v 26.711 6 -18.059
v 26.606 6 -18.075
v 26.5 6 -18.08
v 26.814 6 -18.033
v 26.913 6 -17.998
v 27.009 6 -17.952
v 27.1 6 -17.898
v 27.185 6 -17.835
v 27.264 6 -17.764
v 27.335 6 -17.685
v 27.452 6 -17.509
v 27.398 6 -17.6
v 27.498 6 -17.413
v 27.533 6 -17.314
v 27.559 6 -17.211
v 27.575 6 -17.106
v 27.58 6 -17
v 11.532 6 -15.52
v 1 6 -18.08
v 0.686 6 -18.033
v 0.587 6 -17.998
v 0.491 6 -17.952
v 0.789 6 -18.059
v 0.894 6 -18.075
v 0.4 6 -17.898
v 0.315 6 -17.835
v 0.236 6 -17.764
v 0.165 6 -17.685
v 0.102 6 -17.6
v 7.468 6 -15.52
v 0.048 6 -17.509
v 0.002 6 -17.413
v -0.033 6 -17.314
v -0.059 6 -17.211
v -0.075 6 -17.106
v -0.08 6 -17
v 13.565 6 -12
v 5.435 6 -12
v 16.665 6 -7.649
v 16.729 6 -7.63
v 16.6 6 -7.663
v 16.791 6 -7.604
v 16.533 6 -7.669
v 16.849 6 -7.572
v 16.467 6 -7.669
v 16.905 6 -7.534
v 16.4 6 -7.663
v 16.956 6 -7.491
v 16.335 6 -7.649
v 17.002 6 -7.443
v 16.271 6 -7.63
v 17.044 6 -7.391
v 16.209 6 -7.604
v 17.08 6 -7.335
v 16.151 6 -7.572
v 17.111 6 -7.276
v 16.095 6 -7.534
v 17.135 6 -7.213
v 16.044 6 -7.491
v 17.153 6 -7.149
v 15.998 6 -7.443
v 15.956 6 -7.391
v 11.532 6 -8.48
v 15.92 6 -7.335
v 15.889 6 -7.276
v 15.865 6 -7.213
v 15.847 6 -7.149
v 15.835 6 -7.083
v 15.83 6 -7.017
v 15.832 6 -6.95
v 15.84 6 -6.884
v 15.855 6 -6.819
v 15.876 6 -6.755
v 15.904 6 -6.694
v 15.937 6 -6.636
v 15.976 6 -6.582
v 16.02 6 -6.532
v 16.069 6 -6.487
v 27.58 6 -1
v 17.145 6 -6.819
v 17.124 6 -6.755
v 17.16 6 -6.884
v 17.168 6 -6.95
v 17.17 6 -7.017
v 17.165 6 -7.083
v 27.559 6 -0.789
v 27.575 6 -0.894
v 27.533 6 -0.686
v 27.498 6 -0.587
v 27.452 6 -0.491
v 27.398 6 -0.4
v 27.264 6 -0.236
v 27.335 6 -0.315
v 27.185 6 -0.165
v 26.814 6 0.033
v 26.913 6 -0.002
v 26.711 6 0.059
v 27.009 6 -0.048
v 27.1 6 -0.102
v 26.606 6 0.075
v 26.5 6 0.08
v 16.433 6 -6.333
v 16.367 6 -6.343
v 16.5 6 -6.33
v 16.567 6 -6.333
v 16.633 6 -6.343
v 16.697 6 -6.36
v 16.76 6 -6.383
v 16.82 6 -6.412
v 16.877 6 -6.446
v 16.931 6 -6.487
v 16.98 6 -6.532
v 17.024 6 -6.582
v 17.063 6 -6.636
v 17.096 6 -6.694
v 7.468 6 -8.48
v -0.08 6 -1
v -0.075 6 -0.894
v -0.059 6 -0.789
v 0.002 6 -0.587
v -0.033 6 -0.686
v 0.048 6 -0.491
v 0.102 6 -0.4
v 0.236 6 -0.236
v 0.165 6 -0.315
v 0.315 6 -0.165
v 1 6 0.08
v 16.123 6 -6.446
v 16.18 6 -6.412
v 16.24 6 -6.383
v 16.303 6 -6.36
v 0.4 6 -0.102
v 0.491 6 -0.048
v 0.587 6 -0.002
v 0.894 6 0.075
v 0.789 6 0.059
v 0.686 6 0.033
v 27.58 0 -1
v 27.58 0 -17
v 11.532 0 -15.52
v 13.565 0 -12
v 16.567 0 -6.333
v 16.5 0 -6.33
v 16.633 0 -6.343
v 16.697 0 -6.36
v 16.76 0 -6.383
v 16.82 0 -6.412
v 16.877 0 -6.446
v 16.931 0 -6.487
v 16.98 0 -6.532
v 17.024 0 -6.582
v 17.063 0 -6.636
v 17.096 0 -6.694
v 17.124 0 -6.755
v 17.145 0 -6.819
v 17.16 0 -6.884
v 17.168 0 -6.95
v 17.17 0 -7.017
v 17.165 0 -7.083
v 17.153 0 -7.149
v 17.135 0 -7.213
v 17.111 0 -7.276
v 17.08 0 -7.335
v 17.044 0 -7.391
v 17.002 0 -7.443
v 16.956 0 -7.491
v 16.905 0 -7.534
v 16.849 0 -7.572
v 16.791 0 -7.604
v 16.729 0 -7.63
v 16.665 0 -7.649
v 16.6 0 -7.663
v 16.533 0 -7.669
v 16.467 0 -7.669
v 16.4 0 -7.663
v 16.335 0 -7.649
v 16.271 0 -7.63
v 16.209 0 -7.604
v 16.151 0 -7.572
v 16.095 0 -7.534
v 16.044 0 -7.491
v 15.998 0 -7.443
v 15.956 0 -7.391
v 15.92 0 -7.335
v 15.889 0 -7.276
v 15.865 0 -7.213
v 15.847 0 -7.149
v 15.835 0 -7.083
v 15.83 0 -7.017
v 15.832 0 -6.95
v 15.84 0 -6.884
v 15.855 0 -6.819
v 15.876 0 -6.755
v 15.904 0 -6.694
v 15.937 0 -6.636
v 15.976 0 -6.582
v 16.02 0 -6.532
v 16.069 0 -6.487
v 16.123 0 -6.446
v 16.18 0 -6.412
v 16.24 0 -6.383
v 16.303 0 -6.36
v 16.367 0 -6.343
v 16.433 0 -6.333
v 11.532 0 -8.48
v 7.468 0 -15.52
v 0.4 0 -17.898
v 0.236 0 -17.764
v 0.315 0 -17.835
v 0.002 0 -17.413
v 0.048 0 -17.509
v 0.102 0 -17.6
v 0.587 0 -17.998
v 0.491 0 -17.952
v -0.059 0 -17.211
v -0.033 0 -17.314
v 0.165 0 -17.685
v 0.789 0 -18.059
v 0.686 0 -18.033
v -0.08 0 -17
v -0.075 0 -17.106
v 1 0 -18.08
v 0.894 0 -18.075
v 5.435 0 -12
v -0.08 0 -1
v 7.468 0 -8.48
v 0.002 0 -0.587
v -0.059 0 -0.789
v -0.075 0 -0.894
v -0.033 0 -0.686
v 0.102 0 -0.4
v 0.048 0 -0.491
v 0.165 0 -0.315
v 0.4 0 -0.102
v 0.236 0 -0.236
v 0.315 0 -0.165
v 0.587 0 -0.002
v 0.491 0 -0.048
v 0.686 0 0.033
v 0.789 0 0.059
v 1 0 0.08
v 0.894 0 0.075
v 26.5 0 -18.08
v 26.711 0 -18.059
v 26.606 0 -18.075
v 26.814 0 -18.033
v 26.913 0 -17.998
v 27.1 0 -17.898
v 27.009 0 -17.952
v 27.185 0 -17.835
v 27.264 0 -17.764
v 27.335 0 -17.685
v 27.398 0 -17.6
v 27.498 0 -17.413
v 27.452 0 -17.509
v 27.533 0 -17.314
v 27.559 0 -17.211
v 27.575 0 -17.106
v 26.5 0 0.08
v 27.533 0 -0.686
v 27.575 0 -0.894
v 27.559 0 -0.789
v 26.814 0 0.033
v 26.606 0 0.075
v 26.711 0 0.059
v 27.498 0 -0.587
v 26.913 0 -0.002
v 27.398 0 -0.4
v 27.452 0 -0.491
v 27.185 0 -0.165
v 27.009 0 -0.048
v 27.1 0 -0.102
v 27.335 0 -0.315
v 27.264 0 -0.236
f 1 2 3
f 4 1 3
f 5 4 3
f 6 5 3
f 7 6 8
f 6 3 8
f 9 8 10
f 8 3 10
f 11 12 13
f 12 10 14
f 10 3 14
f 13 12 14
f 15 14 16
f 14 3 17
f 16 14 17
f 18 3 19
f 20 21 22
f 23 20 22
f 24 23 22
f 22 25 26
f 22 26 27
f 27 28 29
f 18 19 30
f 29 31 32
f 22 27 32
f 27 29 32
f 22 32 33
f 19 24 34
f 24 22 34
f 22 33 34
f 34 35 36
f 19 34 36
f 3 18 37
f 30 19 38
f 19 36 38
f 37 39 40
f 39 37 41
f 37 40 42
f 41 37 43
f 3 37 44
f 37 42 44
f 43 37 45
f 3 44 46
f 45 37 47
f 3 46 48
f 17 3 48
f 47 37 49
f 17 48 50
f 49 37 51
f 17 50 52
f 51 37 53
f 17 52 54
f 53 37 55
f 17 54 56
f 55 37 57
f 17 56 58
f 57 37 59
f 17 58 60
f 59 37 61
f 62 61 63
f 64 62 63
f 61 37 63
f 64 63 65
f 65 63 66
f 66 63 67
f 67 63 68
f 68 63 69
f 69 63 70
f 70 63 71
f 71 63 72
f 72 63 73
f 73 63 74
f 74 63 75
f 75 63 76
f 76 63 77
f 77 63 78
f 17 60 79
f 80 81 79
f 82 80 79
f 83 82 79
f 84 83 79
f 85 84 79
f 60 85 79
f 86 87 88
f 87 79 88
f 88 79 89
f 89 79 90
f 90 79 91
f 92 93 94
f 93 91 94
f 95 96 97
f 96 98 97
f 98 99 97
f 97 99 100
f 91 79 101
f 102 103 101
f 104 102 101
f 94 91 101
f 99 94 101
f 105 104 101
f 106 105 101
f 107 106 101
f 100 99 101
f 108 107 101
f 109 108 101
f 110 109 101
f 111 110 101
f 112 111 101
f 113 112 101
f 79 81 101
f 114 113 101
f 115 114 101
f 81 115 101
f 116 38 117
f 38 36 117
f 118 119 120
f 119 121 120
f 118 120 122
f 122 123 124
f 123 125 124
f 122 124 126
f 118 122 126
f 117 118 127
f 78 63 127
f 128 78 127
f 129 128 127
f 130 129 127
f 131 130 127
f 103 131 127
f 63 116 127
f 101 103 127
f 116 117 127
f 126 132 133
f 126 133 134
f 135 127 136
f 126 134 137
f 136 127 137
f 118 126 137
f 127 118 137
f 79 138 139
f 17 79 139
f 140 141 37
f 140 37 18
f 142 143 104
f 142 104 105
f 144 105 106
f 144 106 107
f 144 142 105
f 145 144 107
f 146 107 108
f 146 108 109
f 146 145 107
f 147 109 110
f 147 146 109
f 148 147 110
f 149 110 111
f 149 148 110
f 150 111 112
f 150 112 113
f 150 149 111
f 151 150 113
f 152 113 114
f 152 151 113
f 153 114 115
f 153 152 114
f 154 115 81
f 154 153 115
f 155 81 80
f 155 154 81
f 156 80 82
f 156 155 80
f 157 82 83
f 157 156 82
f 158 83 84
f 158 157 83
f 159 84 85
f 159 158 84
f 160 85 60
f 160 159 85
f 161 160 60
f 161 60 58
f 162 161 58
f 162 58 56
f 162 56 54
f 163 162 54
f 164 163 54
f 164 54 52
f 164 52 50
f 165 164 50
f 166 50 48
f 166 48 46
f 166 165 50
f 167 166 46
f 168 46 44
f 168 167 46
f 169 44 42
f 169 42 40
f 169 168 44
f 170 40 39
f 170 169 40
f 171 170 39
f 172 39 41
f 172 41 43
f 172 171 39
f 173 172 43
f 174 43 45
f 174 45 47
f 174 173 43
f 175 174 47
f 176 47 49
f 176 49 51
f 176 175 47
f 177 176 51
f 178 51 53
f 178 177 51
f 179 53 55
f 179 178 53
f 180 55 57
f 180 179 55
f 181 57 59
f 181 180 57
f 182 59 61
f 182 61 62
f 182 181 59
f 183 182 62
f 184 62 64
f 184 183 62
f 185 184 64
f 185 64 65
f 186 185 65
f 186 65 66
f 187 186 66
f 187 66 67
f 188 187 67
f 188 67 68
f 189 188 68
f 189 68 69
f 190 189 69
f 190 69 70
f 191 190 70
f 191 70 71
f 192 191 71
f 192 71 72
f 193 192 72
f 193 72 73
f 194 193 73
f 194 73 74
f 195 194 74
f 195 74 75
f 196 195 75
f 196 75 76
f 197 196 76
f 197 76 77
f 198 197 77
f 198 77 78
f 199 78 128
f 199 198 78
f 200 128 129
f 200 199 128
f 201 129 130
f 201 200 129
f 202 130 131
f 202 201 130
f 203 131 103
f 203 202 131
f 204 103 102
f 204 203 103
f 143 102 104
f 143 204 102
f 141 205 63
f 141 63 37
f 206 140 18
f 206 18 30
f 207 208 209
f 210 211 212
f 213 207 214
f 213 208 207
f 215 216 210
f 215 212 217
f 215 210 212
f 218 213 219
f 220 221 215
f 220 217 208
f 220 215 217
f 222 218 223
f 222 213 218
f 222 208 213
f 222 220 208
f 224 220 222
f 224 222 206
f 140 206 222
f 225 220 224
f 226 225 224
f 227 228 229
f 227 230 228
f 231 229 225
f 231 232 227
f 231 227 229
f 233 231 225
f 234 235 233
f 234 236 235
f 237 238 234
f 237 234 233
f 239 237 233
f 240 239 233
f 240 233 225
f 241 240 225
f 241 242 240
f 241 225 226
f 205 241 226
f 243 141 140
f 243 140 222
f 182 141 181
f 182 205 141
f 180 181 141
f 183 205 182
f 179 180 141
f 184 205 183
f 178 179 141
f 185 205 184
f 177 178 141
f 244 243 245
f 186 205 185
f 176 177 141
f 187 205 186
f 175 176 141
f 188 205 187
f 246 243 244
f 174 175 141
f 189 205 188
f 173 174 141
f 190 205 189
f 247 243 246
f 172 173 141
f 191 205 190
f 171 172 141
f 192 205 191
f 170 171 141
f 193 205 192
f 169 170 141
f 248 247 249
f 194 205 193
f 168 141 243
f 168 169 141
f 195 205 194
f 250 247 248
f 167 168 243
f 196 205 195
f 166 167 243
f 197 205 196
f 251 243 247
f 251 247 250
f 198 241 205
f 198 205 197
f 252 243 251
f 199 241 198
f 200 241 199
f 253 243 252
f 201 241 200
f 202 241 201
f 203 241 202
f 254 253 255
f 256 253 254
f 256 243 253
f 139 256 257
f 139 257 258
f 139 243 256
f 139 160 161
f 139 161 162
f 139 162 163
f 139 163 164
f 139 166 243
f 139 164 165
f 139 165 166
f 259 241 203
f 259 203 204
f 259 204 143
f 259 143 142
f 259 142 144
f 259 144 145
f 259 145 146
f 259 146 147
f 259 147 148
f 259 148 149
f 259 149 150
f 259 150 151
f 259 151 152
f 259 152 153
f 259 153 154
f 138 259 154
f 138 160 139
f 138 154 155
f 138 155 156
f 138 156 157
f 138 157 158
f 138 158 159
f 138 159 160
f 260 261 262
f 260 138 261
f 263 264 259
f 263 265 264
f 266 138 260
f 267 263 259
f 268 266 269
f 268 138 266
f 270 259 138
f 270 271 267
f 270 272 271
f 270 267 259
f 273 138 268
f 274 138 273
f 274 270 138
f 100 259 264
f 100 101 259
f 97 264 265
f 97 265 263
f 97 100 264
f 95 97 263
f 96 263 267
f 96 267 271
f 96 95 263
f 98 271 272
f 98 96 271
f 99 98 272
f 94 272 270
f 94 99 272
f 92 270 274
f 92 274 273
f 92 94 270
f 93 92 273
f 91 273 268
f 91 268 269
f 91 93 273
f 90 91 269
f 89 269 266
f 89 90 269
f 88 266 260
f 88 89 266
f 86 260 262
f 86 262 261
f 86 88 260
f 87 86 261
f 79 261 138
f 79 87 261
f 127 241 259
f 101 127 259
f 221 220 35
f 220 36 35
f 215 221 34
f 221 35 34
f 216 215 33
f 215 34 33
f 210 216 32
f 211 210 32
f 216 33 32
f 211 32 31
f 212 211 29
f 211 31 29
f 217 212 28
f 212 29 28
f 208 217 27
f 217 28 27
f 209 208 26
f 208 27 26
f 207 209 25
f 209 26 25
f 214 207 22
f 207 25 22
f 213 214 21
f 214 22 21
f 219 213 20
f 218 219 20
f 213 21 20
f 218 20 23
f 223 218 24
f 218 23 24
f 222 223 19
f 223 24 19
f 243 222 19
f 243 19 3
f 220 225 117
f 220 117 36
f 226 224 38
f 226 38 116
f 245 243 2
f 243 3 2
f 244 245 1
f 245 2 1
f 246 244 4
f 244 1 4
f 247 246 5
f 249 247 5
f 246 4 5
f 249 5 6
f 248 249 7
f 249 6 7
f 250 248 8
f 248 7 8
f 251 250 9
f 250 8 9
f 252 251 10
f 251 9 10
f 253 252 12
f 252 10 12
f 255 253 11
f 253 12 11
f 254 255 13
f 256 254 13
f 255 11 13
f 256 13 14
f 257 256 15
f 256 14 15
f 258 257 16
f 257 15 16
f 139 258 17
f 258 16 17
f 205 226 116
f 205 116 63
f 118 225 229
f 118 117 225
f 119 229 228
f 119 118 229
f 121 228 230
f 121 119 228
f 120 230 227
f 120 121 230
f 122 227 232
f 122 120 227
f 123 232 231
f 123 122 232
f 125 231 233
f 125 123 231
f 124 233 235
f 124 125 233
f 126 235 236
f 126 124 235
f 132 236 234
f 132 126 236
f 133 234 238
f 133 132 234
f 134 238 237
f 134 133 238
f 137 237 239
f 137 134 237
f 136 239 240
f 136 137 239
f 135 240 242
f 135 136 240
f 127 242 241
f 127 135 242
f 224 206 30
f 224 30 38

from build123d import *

# Parameters (mm, degrees)
SKETCH1_W           = 27.5
SKETCH1_H           = 18
SKETCH1_R           = 0.75
BOSS_EXTRUDE1_DEPTH = 6
FILLET1_R           = 1
MOVE_FACE1_BY       = 0.08
MOVE_FACE1_2_BY     = 0.08
MOVE_FACE1_3_BY     = 0.08
MOVE_FACE1_4_BY     = 0.08
MOVE_FACE1_5_BY     = 0.08
MOVE_FACE1_6_BY     = 0.08
MOVE_FACE1_7_BY     = 0.08
MOVE_FACE1_8_BY     = 0.08
MOVE_FACE1_9_BY     = 0.08
MOVE_FACE1_10_BY    = 0.08
MOVE_FACE1_11_BY    = 0.08
MOVE_FACE1_12_BY    = 0.08
MOVE_FACE1_13_BY    = 0.08
MOVE_FACE1_14_BY    = 0.08
MOVE_FACE1_15_BY    = 0.08


with BuildPart() as part:
    # Sketch1 → Boss-Extrude1 (new body)
    with BuildSketch(Plane(origin=(0, 0, 0), x_dir=(1, 0, 0), z_dir=(0, 1, 0))):
        with Locations((13.75, 9)):
            Rectangle(SKETCH1_W, SKETCH1_H)
        with Locations(Location((16.5, 7, 0), (0, 0, 270))):
            Circle(SKETCH1_R, mode=Mode.SUBTRACT)
        Polygon((13.656921938, 12), (11.578460969, 15.6), (7.421539031, 15.6), (5.343078062, 12), (7.421539031, 8.4), (11.578460969, 8.4), align=None, mode=Mode.SUBTRACT)
    extrude(amount=BOSS_EXTRUDE1_DEPTH)

    # Fillet1
    fillet1_edges = [part.edges().sort_by_distance(p)[0] for p in [
        (0, 3, -18),
        (27.5, 3, -18),
        (27.5, 3, 0),
        (0, 3, 0),
    ]]
    fillet(fillet1_edges, radius=FILLET1_R)

    # Move Face1: a curved face moved outward by 0.08
    add(Solid.thicken(part.faces().sort_by_distance((16.5, 3, -7.75))[0], MOVE_FACE1_BY))

    # Move Face1 2: a face moved outward by 0.08
    extrude(part.faces().sort_by_distance((12.617691454, 3, -13.8))[0], amount=MOVE_FACE1_2_BY, dir=(-0.866025404, 0, 0.5))

    # Move Face1 3: a face moved outward by 0.08
    extrude(part.faces().sort_by_distance((9.5, 3, -15.6))[0], amount=MOVE_FACE1_3_BY, dir=(0, 0, 1))

    # Move Face1 4: a curved face moved outward by 0.08
    add(Solid.thicken(part.faces().sort_by_distance((27.207106781, 3, -0.292893219))[0], MOVE_FACE1_4_BY))

    # Move Face1 5: a face moved outward by 0.08
    extrude(part.faces().sort_by_distance((27.5, 3, -9))[0], amount=MOVE_FACE1_5_BY, dir=(1, 0, 0))

    # Move Face1 6: a curved face moved outward by 0.08
    add(Solid.thicken(part.faces().sort_by_distance((27.207106781, 3, -17.707106781))[0], MOVE_FACE1_6_BY))

    # Move Face1 7: a face moved outward by 0.08
    extrude(part.faces().sort_by_distance((13.75, 3, -18))[0], amount=MOVE_FACE1_7_BY, dir=(0, 0, -1))

    # Move Face1 8: a curved face moved outward by 0.08
    add(Solid.thicken(part.faces().sort_by_distance((0.292893219, 3, -17.707106781))[0], MOVE_FACE1_8_BY))

    # Move Face1 9: a face moved outward by 0.08
    extrude(part.faces().sort_by_distance((0, 3, -9))[0], amount=MOVE_FACE1_9_BY, dir=(-1, 0, 0))

    # Move Face1 10: a curved face moved outward by 0.08
    add(Solid.thicken(part.faces().sort_by_distance((0.292893219, 3, -0.292893219))[0], MOVE_FACE1_10_BY))

    # Move Face1 11: a face moved outward by 0.08
    extrude(part.faces().sort_by_distance((13.75, 3, 0))[0], amount=MOVE_FACE1_11_BY, dir=(0, 0, 1))

    # Move Face1 12: a face moved outward by 0.08
    extrude(part.faces().sort_by_distance((6.382308546, 3, -13.8))[0], amount=MOVE_FACE1_12_BY, dir=(0.866025404, 0, 0.5))

    # Move Face1 13: a face moved outward by 0.08
    extrude(part.faces().sort_by_distance((9.5, 3, -8.4))[0], amount=MOVE_FACE1_13_BY, dir=(0, 0, -1))

    # Move Face1 14: a face moved outward by 0.08
    extrude(part.faces().sort_by_distance((6.382308546, 3, -10.2))[0], amount=MOVE_FACE1_14_BY, dir=(0.866025404, 0, -0.5))

    # Move Face1 15: a face moved outward by 0.08
    extrude(part.faces().sort_by_distance((12.617691454, 3, -10.2))[0], amount=MOVE_FACE1_15_BY, dir=(-0.866025404, 0, -0.5))


solid = part.part
